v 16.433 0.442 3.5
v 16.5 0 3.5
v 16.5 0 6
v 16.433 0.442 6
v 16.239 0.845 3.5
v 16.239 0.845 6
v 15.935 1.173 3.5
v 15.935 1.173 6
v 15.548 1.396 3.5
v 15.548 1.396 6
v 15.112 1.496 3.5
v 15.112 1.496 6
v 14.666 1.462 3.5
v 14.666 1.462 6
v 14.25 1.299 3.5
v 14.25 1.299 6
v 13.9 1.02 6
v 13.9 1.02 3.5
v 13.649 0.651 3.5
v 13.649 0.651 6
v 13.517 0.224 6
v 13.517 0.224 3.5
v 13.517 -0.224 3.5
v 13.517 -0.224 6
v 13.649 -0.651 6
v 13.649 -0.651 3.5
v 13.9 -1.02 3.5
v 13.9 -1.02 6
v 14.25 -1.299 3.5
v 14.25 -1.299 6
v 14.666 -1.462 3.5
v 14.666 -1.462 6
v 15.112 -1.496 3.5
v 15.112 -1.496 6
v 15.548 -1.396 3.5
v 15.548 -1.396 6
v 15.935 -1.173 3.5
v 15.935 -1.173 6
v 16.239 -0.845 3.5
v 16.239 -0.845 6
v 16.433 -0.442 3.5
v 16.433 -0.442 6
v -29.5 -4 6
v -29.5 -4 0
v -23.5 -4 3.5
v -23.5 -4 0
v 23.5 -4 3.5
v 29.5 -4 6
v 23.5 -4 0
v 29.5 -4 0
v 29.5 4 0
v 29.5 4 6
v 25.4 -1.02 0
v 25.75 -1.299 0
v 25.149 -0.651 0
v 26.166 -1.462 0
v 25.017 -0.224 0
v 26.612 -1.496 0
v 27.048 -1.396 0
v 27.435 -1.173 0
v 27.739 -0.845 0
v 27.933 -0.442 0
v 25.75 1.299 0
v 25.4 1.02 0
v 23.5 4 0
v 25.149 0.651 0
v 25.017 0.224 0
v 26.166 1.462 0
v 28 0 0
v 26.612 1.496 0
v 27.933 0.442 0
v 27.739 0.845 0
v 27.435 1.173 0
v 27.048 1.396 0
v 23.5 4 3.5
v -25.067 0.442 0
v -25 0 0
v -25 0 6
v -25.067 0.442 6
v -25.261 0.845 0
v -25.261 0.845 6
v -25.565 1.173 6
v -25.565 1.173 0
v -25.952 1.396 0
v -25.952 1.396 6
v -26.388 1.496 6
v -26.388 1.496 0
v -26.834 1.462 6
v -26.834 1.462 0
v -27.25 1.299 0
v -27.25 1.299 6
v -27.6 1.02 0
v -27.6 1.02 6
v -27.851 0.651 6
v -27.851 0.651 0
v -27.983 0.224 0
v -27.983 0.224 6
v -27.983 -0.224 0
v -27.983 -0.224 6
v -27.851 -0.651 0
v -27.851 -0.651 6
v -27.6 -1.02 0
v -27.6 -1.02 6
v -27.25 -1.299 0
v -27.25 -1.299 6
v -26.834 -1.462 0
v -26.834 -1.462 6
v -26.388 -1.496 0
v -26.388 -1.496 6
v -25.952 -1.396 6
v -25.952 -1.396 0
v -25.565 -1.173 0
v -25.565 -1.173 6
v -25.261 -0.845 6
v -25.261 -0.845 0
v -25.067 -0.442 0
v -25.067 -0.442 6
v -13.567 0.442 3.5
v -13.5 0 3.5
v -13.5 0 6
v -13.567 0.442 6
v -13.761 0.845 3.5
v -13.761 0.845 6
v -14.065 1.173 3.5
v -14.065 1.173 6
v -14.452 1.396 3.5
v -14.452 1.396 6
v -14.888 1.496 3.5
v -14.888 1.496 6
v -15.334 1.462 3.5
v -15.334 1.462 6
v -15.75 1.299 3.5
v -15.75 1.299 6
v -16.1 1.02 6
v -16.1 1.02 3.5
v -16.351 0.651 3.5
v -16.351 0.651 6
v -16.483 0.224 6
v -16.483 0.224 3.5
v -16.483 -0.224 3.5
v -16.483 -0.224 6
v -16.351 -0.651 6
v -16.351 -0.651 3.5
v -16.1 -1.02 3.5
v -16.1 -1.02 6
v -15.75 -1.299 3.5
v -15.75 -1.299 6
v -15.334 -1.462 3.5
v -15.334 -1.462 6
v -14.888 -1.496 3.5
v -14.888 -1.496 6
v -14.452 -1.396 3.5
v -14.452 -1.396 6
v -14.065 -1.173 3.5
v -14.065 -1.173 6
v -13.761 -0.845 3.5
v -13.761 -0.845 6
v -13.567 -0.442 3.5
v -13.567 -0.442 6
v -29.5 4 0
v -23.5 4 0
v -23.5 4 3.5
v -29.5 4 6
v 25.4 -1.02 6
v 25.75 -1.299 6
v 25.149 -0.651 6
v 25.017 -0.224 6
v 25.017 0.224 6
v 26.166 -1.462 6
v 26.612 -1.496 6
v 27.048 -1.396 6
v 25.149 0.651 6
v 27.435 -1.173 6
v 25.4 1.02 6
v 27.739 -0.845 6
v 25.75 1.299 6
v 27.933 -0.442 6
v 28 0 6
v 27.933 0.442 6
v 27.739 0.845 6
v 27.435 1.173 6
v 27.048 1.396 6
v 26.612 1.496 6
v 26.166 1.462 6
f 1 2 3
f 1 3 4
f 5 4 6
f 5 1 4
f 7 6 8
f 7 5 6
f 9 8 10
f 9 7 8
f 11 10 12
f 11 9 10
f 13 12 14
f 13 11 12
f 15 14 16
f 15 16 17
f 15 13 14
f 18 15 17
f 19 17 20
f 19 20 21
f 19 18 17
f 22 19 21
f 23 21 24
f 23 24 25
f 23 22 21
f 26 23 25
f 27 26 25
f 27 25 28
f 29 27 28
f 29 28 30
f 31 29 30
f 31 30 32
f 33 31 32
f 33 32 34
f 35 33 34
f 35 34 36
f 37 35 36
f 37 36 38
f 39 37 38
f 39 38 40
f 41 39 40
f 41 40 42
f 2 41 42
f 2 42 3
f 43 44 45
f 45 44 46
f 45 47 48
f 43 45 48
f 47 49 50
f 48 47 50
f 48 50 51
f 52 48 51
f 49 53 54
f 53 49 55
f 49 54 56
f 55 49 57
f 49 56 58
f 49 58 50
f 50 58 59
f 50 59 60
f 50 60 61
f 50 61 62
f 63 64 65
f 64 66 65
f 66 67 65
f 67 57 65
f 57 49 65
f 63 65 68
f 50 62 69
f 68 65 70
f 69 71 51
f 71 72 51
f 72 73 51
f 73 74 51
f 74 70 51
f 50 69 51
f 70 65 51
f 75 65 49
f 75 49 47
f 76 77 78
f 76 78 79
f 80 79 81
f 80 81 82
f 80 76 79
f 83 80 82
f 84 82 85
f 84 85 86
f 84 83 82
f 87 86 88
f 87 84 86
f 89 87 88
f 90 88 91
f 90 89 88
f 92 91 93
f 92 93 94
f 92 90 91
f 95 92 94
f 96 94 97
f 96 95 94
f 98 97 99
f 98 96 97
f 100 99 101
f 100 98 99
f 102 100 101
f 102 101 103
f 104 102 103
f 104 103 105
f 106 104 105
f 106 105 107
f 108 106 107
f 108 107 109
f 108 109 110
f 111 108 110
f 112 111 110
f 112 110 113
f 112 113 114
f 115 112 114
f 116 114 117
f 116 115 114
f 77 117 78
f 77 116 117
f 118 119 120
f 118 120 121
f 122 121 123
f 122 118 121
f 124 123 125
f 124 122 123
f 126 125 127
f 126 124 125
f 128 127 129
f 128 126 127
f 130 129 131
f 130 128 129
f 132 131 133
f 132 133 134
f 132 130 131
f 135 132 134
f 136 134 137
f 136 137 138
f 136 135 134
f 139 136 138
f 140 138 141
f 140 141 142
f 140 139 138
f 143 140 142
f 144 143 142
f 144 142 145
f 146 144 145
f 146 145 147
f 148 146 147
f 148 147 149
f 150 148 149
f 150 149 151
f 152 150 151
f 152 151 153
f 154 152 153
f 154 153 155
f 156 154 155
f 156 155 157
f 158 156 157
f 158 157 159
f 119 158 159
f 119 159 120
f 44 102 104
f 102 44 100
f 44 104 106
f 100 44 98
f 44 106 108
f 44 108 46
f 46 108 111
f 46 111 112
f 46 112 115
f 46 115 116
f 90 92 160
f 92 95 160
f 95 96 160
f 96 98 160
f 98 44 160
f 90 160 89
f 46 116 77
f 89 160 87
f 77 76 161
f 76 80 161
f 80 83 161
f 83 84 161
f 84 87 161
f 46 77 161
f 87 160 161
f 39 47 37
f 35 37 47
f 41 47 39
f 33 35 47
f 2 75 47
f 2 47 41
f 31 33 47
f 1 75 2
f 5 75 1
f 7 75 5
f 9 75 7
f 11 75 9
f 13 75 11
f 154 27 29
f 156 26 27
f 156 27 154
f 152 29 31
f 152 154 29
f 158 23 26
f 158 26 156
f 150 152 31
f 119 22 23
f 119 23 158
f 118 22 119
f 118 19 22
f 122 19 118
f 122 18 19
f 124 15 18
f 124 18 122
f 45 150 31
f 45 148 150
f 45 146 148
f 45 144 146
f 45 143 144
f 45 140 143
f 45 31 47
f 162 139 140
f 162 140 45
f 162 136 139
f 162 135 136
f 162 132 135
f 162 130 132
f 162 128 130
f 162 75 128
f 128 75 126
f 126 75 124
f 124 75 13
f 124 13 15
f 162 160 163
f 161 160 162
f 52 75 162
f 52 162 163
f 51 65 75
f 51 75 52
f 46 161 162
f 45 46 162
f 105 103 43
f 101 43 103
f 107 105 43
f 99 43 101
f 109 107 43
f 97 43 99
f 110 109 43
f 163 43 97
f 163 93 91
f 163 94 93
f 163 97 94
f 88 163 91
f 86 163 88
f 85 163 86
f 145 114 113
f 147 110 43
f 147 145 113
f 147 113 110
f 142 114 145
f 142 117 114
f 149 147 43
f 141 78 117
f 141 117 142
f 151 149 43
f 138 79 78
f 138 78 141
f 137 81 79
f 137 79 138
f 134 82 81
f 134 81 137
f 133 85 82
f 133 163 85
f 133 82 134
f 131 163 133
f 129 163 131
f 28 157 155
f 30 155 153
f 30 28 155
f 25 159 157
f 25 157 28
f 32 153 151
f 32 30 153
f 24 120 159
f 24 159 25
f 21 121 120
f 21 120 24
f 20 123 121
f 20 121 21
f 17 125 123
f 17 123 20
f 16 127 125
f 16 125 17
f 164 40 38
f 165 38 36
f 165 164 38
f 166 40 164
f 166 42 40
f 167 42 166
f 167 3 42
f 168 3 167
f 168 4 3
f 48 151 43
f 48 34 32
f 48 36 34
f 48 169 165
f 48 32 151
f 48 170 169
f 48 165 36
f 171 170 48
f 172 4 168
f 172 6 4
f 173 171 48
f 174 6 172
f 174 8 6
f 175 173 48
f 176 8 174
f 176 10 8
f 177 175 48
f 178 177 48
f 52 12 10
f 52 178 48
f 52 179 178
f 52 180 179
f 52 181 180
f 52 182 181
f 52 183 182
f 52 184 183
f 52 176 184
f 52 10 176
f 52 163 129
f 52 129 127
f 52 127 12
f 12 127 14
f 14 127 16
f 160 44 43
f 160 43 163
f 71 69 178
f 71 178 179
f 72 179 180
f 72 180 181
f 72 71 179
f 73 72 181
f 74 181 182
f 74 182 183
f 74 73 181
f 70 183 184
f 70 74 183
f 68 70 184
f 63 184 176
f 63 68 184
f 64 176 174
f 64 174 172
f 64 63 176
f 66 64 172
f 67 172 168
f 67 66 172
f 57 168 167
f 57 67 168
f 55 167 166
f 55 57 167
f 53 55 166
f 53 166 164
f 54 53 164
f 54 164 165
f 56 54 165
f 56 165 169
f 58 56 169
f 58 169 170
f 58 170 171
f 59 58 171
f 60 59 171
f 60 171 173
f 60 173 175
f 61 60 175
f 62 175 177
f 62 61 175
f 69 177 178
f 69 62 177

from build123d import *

# Parameters (mm, degrees)
SKETCH1_W           = 59
SKETCH1_H           = 8
SKETCH1_R           = 1.5
BOSS_EXTRUDE1_DEPTH = 6
SKETCH2_W           = 47
SKETCH2_H           = 7
CUT_EXTRUDE1_DEPTH  = 15


with BuildPart() as part:
    # Sketch1 → Boss-Extrude1 (new body)
    with BuildSketch(Plane.XY):
        Rectangle(SKETCH1_W, SKETCH1_H)
        with Locations((-26.5, 0)):
            Circle(SKETCH1_R, mode=Mode.SUBTRACT)
        with Locations((-15, 0)):
            Circle(SKETCH1_R, mode=Mode.SUBTRACT)
        with Locations((15, 0)):
            Circle(SKETCH1_R, mode=Mode.SUBTRACT)
        with Locations((26.5, 0)):
            Circle(SKETCH1_R, mode=Mode.SUBTRACT)
    extrude(amount=BOSS_EXTRUDE1_DEPTH)

    # Sketch2 → Cut-Extrude1 (cut)
    with BuildSketch(Plane(origin=(0, 4, 0), x_dir=(-1, 0, 0), z_dir=(0, 1, 0))):
        Rectangle(SKETCH2_W, SKETCH2_H)
    extrude(amount=-CUT_EXTRUDE1_DEPTH, mode=Mode.SUBTRACT)


solid = part.part
